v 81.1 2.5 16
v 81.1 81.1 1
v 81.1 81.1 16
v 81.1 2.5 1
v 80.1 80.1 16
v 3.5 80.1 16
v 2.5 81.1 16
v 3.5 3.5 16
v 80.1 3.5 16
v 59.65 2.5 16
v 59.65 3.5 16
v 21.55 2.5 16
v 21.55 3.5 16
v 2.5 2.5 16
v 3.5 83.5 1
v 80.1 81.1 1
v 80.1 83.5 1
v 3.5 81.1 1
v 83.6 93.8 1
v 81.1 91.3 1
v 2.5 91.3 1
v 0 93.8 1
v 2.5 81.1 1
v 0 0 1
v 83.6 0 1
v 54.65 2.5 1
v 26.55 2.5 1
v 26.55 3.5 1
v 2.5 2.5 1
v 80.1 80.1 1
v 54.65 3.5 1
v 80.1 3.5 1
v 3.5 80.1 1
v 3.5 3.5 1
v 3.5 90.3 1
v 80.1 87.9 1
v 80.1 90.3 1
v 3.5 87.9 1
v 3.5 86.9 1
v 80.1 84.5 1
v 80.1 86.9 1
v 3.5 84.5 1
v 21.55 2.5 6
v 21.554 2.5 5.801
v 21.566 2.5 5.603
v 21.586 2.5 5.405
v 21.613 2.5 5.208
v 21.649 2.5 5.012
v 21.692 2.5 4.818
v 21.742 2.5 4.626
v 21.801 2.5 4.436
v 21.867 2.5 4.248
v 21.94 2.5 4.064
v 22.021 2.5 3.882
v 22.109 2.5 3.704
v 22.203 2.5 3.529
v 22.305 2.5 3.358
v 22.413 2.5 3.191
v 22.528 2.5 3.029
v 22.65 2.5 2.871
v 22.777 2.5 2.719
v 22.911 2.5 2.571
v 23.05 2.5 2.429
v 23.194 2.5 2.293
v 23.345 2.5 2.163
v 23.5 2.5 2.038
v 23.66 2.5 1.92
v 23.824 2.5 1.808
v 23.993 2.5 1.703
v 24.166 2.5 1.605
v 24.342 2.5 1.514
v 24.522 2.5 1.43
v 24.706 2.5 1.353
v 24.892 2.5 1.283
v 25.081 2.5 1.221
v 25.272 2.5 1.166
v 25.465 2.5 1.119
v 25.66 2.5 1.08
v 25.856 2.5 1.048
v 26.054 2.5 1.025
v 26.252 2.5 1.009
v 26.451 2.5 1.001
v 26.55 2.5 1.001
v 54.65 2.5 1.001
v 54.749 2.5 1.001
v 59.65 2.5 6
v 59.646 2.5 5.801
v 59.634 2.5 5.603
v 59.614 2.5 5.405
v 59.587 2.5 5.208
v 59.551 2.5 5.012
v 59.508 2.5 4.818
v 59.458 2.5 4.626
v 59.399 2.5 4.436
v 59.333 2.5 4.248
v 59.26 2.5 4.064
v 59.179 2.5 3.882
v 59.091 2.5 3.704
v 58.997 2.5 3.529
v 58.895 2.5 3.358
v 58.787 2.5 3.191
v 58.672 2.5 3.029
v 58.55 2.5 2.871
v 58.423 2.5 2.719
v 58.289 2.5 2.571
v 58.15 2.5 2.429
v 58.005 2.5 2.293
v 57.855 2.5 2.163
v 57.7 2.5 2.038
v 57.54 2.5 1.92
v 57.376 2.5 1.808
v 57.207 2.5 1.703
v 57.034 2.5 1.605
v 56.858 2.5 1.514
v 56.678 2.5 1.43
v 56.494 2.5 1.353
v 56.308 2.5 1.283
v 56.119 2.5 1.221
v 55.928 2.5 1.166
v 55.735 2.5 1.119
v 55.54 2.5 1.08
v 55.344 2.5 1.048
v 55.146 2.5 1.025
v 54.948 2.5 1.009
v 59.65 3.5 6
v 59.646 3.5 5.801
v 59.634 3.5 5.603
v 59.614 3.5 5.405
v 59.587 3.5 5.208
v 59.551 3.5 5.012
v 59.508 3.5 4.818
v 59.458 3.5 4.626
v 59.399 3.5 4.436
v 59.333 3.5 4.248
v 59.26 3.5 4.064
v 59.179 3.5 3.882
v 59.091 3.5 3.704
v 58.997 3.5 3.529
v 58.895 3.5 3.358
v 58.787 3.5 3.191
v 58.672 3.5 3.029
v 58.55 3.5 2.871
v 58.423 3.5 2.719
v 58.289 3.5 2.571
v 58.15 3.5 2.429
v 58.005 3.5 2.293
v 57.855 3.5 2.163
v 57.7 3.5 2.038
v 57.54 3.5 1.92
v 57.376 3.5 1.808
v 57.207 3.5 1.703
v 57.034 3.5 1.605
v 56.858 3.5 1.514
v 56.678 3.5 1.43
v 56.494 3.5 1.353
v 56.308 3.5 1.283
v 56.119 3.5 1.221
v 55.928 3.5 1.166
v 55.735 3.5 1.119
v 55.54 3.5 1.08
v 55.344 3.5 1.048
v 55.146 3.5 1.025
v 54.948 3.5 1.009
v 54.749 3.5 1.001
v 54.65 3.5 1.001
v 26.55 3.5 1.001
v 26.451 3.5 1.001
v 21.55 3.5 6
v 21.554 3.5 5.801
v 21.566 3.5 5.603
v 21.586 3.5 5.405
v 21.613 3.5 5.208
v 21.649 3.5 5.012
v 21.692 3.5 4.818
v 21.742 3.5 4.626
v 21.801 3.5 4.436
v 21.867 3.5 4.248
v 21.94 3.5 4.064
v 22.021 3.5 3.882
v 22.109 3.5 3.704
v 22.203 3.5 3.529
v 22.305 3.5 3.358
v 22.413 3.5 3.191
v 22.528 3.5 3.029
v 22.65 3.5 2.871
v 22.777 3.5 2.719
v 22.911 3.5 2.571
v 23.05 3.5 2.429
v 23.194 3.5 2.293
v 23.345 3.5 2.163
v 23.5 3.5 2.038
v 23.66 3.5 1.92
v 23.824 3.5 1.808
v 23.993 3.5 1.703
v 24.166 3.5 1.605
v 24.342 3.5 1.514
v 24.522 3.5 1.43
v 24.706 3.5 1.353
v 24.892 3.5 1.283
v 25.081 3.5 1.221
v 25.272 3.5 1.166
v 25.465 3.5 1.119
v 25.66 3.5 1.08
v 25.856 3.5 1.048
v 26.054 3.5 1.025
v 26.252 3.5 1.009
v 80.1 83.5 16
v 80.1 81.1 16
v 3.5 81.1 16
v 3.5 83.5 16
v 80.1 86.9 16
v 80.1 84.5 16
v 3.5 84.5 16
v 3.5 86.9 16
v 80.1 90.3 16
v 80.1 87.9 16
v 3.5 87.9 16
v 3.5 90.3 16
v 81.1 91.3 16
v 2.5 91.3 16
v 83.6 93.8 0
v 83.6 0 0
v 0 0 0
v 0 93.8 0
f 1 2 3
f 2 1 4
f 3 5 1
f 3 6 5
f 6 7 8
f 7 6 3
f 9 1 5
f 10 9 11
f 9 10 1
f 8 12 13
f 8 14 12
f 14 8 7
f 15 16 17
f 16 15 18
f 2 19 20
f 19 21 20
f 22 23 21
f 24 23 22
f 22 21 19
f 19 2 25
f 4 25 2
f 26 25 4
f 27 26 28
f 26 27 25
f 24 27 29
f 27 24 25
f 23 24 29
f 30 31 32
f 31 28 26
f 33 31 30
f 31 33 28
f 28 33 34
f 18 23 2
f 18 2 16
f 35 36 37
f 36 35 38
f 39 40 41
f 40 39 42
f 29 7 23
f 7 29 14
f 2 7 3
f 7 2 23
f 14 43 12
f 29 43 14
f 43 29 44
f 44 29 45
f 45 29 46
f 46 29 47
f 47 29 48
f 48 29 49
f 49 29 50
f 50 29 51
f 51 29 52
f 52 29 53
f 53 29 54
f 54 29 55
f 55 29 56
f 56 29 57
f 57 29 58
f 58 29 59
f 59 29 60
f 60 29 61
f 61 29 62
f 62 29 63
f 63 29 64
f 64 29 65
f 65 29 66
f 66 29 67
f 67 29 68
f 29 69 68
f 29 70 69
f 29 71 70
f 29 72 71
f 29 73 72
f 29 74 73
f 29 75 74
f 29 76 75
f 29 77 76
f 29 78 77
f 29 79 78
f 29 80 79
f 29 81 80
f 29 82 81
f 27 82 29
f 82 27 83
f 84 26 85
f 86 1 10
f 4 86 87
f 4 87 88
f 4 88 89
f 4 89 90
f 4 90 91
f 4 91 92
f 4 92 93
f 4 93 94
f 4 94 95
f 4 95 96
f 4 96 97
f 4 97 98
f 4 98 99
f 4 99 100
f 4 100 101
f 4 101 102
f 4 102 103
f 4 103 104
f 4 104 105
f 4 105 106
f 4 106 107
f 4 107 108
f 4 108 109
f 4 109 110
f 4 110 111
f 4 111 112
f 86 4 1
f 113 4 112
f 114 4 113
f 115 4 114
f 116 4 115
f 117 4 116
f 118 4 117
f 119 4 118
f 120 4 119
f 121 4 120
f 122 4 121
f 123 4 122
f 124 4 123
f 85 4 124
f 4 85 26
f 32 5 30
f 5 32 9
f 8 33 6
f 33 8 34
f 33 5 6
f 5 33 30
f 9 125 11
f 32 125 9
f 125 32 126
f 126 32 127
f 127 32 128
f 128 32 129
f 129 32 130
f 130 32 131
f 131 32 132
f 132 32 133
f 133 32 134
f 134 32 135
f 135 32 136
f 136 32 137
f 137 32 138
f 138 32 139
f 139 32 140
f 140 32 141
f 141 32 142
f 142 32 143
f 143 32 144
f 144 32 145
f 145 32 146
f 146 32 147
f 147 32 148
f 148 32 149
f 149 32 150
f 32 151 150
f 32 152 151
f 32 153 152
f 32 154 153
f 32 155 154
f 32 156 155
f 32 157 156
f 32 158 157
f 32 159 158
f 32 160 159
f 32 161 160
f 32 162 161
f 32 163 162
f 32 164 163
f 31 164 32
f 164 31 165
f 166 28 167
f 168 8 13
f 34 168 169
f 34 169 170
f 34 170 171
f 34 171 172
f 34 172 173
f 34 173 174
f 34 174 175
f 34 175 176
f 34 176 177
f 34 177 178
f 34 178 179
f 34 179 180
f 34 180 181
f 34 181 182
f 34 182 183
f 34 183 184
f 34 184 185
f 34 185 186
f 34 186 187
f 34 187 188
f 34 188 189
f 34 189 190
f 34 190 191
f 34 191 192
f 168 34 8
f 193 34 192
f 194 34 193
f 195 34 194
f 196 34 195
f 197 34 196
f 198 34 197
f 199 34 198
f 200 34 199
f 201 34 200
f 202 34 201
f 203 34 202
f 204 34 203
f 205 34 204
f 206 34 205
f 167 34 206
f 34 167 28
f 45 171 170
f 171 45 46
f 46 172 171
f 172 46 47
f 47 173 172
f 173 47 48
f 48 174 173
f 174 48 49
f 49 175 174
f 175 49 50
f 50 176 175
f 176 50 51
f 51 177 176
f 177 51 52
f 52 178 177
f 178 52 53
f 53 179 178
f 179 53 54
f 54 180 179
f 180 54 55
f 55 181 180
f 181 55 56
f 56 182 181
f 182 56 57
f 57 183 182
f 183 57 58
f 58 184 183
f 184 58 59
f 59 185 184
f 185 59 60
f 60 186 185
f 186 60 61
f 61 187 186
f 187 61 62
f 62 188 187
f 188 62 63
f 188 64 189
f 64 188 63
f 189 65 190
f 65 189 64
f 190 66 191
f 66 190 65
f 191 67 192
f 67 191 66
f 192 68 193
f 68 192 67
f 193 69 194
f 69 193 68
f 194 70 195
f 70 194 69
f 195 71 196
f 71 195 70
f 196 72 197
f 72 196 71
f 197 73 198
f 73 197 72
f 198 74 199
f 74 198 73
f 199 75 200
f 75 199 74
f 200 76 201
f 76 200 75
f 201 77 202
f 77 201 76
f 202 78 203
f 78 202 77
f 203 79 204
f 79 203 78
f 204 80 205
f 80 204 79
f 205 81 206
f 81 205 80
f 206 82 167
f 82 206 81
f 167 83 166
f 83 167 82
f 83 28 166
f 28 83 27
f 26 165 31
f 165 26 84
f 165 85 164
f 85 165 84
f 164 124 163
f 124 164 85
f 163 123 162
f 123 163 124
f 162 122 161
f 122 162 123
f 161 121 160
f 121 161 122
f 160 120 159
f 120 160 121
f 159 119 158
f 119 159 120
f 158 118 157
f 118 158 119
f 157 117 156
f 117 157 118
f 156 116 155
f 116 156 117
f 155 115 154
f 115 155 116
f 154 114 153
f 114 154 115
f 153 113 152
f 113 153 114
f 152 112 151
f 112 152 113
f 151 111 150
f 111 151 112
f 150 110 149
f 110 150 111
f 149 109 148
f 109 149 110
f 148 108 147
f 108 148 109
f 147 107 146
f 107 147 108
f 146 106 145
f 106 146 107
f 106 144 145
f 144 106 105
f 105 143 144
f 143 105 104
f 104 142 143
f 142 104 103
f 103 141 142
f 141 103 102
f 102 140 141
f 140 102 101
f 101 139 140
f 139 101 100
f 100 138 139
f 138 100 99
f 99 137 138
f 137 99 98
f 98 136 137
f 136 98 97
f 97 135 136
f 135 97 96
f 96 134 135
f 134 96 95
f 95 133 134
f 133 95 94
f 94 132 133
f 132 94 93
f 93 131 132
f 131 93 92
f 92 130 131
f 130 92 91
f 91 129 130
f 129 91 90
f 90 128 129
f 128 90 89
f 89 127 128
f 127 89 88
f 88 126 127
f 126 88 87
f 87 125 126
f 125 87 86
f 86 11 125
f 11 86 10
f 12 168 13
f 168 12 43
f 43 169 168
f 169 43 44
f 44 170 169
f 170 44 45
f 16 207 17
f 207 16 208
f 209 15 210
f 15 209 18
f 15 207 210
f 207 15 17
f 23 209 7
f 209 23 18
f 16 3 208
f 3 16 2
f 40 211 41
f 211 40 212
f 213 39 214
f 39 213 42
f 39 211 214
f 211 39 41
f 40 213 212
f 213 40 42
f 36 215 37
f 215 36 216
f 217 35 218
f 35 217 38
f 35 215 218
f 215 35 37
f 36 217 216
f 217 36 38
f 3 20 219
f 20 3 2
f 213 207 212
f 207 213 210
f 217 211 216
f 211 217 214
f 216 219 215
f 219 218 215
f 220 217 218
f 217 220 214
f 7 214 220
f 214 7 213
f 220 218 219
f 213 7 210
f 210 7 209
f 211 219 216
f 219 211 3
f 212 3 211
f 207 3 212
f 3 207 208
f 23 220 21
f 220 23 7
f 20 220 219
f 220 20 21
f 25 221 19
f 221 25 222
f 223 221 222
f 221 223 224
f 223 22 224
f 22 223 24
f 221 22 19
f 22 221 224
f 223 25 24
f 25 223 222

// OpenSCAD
// All values in mm unless a quanity or states otherwise

/* [Render Parameters] */
Item = "Holder"; // ["Holder", "ToDoTemplate"]
$fs = 0.2;
$fa = 0.1;

/* [Fitment] */
Global_Clearance = 0.2;

/* [Post-It] */
PostIt_Length = 76.2;
PostIt_Width = 76.2;
PostIt_Height = 15.0;

/* [Holder] */
Base_Thickness = 1.0;
Base_Padding = 2.5;
Wall_Thickness = 1.0;
Finger_Hole_Ratio = 0.5;
Finger_Hole_Radius = 5.0;

/* [Templates] */
Number_Of_Holders = 3;
Holder_thickness = 2.0;

Total_Perimeter = Base_Padding + Wall_Thickness + Global_Clearance;
Holder_Length = Number_Of_Holders > 0 ? Number_Of_Holders * (Wall_Thickness + Holder_thickness + (2 * Global_Clearance)) : 0; 
Total_Width = ((Total_Perimeter) * 2) + PostIt_Width;
Total_Length = ((Total_Perimeter) * 2) + PostIt_Length + Holder_Length;


// Model
if (Item == "Holder")
{
    PostITHolder();
}
else
{
    Template(Item);
}

module Template(Item)
{
     difference()
    {
        TemplateBase();
    }
}

module TemplateBase()
{
    cube([PostIt_Width, PostIt_Length, Holder_thickness]);
}

module PostITHolder()
{
    Base();
    PostItHolder();
    if (Number_Of_Holders > 0)
    {
        TemplateHolders();
    }
}

// Design Modules
module Base()
{
    cube([Total_Width, Total_Length, Base_Thickness]);
}

module PostItHolder()
{
    noteOffset = Wall_Thickness + Global_Clearance;
    
    translate([Base_Padding, Base_Padding, Base_Thickness])
    {
        difference()
        {
            color("red")
            cube([(noteOffset * 2) + PostIt_Width, (noteOffset * 2) + PostIt_Length, PostIt_Height]);
            
            translate([Wall_Thickness, Wall_Thickness, 0])
            cube([PostIt_Width + (2 * Global_Clearance), PostIt_Length + (2 * Global_Clearance), PostIt_Height + 1]);
            
            FingerHole();
        }
    }
}

module FingerHole()
{
    holeWidth = PostIt_Width * Finger_Hole_Ratio;
    
    translate([(PostIt_Width / 2) - (holeWidth / 2),Wall_Thickness,0])
    rotate([90,0,0])
    linear_extrude(Wall_Thickness)
    {
        union()
        {
            //top rectangle
            translate([0,Finger_Hole_Radius])
            square([holeWidth, PostIt_Height - Finger_Hole_Radius]);
            
            translate([Finger_Hole_Radius,0])
            square([holeWidth - (2 * Finger_Hole_Radius), Finger_Hole_Radius]);
            
            //bottom rectangle with radius
            intersection()
            {
                square([holeWidth, Finger_Hole_Radius]);
                translate([Finger_Hole_Radius,Finger_Hole_Radius])
                circle(r = Finger_Hole_Radius);
            }
            
            intersection()
            {
                square([holeWidth, Finger_Hole_Radius]);
                translate([holeWidth - Finger_Hole_Radius,Finger_Hole_Radius])
                circle(r = Finger_Hole_Radius);    
            }
        }
    }
}

module TemplateHolders()
{
   holderYDistance = Wall_Thickness + (2 * Global_Clearance) + Holder_thickness;   
   translate([Base_Padding, Base_Padding + PostIt_Length + (2 * (Wall_Thickness + Global_Clearance)), Base_Thickness])
    {
        difference()
        {
            color("blue")
            cube([((Wall_Thickness + Global_Clearance) * 2) + PostIt_Width, Holder_Length, PostIt_Height]);
            
            for (i = [0:Number_Of_Holders - 1]) 
            {
                translate([Wall_Thickness, i * holderYDistance, 0])
                cube([PostIt_Width + (2 * Global_Clearance), Holder_thickness + (2 * Global_Clearance), PostIt_Height + 1]);
            }
        }
    }
}
